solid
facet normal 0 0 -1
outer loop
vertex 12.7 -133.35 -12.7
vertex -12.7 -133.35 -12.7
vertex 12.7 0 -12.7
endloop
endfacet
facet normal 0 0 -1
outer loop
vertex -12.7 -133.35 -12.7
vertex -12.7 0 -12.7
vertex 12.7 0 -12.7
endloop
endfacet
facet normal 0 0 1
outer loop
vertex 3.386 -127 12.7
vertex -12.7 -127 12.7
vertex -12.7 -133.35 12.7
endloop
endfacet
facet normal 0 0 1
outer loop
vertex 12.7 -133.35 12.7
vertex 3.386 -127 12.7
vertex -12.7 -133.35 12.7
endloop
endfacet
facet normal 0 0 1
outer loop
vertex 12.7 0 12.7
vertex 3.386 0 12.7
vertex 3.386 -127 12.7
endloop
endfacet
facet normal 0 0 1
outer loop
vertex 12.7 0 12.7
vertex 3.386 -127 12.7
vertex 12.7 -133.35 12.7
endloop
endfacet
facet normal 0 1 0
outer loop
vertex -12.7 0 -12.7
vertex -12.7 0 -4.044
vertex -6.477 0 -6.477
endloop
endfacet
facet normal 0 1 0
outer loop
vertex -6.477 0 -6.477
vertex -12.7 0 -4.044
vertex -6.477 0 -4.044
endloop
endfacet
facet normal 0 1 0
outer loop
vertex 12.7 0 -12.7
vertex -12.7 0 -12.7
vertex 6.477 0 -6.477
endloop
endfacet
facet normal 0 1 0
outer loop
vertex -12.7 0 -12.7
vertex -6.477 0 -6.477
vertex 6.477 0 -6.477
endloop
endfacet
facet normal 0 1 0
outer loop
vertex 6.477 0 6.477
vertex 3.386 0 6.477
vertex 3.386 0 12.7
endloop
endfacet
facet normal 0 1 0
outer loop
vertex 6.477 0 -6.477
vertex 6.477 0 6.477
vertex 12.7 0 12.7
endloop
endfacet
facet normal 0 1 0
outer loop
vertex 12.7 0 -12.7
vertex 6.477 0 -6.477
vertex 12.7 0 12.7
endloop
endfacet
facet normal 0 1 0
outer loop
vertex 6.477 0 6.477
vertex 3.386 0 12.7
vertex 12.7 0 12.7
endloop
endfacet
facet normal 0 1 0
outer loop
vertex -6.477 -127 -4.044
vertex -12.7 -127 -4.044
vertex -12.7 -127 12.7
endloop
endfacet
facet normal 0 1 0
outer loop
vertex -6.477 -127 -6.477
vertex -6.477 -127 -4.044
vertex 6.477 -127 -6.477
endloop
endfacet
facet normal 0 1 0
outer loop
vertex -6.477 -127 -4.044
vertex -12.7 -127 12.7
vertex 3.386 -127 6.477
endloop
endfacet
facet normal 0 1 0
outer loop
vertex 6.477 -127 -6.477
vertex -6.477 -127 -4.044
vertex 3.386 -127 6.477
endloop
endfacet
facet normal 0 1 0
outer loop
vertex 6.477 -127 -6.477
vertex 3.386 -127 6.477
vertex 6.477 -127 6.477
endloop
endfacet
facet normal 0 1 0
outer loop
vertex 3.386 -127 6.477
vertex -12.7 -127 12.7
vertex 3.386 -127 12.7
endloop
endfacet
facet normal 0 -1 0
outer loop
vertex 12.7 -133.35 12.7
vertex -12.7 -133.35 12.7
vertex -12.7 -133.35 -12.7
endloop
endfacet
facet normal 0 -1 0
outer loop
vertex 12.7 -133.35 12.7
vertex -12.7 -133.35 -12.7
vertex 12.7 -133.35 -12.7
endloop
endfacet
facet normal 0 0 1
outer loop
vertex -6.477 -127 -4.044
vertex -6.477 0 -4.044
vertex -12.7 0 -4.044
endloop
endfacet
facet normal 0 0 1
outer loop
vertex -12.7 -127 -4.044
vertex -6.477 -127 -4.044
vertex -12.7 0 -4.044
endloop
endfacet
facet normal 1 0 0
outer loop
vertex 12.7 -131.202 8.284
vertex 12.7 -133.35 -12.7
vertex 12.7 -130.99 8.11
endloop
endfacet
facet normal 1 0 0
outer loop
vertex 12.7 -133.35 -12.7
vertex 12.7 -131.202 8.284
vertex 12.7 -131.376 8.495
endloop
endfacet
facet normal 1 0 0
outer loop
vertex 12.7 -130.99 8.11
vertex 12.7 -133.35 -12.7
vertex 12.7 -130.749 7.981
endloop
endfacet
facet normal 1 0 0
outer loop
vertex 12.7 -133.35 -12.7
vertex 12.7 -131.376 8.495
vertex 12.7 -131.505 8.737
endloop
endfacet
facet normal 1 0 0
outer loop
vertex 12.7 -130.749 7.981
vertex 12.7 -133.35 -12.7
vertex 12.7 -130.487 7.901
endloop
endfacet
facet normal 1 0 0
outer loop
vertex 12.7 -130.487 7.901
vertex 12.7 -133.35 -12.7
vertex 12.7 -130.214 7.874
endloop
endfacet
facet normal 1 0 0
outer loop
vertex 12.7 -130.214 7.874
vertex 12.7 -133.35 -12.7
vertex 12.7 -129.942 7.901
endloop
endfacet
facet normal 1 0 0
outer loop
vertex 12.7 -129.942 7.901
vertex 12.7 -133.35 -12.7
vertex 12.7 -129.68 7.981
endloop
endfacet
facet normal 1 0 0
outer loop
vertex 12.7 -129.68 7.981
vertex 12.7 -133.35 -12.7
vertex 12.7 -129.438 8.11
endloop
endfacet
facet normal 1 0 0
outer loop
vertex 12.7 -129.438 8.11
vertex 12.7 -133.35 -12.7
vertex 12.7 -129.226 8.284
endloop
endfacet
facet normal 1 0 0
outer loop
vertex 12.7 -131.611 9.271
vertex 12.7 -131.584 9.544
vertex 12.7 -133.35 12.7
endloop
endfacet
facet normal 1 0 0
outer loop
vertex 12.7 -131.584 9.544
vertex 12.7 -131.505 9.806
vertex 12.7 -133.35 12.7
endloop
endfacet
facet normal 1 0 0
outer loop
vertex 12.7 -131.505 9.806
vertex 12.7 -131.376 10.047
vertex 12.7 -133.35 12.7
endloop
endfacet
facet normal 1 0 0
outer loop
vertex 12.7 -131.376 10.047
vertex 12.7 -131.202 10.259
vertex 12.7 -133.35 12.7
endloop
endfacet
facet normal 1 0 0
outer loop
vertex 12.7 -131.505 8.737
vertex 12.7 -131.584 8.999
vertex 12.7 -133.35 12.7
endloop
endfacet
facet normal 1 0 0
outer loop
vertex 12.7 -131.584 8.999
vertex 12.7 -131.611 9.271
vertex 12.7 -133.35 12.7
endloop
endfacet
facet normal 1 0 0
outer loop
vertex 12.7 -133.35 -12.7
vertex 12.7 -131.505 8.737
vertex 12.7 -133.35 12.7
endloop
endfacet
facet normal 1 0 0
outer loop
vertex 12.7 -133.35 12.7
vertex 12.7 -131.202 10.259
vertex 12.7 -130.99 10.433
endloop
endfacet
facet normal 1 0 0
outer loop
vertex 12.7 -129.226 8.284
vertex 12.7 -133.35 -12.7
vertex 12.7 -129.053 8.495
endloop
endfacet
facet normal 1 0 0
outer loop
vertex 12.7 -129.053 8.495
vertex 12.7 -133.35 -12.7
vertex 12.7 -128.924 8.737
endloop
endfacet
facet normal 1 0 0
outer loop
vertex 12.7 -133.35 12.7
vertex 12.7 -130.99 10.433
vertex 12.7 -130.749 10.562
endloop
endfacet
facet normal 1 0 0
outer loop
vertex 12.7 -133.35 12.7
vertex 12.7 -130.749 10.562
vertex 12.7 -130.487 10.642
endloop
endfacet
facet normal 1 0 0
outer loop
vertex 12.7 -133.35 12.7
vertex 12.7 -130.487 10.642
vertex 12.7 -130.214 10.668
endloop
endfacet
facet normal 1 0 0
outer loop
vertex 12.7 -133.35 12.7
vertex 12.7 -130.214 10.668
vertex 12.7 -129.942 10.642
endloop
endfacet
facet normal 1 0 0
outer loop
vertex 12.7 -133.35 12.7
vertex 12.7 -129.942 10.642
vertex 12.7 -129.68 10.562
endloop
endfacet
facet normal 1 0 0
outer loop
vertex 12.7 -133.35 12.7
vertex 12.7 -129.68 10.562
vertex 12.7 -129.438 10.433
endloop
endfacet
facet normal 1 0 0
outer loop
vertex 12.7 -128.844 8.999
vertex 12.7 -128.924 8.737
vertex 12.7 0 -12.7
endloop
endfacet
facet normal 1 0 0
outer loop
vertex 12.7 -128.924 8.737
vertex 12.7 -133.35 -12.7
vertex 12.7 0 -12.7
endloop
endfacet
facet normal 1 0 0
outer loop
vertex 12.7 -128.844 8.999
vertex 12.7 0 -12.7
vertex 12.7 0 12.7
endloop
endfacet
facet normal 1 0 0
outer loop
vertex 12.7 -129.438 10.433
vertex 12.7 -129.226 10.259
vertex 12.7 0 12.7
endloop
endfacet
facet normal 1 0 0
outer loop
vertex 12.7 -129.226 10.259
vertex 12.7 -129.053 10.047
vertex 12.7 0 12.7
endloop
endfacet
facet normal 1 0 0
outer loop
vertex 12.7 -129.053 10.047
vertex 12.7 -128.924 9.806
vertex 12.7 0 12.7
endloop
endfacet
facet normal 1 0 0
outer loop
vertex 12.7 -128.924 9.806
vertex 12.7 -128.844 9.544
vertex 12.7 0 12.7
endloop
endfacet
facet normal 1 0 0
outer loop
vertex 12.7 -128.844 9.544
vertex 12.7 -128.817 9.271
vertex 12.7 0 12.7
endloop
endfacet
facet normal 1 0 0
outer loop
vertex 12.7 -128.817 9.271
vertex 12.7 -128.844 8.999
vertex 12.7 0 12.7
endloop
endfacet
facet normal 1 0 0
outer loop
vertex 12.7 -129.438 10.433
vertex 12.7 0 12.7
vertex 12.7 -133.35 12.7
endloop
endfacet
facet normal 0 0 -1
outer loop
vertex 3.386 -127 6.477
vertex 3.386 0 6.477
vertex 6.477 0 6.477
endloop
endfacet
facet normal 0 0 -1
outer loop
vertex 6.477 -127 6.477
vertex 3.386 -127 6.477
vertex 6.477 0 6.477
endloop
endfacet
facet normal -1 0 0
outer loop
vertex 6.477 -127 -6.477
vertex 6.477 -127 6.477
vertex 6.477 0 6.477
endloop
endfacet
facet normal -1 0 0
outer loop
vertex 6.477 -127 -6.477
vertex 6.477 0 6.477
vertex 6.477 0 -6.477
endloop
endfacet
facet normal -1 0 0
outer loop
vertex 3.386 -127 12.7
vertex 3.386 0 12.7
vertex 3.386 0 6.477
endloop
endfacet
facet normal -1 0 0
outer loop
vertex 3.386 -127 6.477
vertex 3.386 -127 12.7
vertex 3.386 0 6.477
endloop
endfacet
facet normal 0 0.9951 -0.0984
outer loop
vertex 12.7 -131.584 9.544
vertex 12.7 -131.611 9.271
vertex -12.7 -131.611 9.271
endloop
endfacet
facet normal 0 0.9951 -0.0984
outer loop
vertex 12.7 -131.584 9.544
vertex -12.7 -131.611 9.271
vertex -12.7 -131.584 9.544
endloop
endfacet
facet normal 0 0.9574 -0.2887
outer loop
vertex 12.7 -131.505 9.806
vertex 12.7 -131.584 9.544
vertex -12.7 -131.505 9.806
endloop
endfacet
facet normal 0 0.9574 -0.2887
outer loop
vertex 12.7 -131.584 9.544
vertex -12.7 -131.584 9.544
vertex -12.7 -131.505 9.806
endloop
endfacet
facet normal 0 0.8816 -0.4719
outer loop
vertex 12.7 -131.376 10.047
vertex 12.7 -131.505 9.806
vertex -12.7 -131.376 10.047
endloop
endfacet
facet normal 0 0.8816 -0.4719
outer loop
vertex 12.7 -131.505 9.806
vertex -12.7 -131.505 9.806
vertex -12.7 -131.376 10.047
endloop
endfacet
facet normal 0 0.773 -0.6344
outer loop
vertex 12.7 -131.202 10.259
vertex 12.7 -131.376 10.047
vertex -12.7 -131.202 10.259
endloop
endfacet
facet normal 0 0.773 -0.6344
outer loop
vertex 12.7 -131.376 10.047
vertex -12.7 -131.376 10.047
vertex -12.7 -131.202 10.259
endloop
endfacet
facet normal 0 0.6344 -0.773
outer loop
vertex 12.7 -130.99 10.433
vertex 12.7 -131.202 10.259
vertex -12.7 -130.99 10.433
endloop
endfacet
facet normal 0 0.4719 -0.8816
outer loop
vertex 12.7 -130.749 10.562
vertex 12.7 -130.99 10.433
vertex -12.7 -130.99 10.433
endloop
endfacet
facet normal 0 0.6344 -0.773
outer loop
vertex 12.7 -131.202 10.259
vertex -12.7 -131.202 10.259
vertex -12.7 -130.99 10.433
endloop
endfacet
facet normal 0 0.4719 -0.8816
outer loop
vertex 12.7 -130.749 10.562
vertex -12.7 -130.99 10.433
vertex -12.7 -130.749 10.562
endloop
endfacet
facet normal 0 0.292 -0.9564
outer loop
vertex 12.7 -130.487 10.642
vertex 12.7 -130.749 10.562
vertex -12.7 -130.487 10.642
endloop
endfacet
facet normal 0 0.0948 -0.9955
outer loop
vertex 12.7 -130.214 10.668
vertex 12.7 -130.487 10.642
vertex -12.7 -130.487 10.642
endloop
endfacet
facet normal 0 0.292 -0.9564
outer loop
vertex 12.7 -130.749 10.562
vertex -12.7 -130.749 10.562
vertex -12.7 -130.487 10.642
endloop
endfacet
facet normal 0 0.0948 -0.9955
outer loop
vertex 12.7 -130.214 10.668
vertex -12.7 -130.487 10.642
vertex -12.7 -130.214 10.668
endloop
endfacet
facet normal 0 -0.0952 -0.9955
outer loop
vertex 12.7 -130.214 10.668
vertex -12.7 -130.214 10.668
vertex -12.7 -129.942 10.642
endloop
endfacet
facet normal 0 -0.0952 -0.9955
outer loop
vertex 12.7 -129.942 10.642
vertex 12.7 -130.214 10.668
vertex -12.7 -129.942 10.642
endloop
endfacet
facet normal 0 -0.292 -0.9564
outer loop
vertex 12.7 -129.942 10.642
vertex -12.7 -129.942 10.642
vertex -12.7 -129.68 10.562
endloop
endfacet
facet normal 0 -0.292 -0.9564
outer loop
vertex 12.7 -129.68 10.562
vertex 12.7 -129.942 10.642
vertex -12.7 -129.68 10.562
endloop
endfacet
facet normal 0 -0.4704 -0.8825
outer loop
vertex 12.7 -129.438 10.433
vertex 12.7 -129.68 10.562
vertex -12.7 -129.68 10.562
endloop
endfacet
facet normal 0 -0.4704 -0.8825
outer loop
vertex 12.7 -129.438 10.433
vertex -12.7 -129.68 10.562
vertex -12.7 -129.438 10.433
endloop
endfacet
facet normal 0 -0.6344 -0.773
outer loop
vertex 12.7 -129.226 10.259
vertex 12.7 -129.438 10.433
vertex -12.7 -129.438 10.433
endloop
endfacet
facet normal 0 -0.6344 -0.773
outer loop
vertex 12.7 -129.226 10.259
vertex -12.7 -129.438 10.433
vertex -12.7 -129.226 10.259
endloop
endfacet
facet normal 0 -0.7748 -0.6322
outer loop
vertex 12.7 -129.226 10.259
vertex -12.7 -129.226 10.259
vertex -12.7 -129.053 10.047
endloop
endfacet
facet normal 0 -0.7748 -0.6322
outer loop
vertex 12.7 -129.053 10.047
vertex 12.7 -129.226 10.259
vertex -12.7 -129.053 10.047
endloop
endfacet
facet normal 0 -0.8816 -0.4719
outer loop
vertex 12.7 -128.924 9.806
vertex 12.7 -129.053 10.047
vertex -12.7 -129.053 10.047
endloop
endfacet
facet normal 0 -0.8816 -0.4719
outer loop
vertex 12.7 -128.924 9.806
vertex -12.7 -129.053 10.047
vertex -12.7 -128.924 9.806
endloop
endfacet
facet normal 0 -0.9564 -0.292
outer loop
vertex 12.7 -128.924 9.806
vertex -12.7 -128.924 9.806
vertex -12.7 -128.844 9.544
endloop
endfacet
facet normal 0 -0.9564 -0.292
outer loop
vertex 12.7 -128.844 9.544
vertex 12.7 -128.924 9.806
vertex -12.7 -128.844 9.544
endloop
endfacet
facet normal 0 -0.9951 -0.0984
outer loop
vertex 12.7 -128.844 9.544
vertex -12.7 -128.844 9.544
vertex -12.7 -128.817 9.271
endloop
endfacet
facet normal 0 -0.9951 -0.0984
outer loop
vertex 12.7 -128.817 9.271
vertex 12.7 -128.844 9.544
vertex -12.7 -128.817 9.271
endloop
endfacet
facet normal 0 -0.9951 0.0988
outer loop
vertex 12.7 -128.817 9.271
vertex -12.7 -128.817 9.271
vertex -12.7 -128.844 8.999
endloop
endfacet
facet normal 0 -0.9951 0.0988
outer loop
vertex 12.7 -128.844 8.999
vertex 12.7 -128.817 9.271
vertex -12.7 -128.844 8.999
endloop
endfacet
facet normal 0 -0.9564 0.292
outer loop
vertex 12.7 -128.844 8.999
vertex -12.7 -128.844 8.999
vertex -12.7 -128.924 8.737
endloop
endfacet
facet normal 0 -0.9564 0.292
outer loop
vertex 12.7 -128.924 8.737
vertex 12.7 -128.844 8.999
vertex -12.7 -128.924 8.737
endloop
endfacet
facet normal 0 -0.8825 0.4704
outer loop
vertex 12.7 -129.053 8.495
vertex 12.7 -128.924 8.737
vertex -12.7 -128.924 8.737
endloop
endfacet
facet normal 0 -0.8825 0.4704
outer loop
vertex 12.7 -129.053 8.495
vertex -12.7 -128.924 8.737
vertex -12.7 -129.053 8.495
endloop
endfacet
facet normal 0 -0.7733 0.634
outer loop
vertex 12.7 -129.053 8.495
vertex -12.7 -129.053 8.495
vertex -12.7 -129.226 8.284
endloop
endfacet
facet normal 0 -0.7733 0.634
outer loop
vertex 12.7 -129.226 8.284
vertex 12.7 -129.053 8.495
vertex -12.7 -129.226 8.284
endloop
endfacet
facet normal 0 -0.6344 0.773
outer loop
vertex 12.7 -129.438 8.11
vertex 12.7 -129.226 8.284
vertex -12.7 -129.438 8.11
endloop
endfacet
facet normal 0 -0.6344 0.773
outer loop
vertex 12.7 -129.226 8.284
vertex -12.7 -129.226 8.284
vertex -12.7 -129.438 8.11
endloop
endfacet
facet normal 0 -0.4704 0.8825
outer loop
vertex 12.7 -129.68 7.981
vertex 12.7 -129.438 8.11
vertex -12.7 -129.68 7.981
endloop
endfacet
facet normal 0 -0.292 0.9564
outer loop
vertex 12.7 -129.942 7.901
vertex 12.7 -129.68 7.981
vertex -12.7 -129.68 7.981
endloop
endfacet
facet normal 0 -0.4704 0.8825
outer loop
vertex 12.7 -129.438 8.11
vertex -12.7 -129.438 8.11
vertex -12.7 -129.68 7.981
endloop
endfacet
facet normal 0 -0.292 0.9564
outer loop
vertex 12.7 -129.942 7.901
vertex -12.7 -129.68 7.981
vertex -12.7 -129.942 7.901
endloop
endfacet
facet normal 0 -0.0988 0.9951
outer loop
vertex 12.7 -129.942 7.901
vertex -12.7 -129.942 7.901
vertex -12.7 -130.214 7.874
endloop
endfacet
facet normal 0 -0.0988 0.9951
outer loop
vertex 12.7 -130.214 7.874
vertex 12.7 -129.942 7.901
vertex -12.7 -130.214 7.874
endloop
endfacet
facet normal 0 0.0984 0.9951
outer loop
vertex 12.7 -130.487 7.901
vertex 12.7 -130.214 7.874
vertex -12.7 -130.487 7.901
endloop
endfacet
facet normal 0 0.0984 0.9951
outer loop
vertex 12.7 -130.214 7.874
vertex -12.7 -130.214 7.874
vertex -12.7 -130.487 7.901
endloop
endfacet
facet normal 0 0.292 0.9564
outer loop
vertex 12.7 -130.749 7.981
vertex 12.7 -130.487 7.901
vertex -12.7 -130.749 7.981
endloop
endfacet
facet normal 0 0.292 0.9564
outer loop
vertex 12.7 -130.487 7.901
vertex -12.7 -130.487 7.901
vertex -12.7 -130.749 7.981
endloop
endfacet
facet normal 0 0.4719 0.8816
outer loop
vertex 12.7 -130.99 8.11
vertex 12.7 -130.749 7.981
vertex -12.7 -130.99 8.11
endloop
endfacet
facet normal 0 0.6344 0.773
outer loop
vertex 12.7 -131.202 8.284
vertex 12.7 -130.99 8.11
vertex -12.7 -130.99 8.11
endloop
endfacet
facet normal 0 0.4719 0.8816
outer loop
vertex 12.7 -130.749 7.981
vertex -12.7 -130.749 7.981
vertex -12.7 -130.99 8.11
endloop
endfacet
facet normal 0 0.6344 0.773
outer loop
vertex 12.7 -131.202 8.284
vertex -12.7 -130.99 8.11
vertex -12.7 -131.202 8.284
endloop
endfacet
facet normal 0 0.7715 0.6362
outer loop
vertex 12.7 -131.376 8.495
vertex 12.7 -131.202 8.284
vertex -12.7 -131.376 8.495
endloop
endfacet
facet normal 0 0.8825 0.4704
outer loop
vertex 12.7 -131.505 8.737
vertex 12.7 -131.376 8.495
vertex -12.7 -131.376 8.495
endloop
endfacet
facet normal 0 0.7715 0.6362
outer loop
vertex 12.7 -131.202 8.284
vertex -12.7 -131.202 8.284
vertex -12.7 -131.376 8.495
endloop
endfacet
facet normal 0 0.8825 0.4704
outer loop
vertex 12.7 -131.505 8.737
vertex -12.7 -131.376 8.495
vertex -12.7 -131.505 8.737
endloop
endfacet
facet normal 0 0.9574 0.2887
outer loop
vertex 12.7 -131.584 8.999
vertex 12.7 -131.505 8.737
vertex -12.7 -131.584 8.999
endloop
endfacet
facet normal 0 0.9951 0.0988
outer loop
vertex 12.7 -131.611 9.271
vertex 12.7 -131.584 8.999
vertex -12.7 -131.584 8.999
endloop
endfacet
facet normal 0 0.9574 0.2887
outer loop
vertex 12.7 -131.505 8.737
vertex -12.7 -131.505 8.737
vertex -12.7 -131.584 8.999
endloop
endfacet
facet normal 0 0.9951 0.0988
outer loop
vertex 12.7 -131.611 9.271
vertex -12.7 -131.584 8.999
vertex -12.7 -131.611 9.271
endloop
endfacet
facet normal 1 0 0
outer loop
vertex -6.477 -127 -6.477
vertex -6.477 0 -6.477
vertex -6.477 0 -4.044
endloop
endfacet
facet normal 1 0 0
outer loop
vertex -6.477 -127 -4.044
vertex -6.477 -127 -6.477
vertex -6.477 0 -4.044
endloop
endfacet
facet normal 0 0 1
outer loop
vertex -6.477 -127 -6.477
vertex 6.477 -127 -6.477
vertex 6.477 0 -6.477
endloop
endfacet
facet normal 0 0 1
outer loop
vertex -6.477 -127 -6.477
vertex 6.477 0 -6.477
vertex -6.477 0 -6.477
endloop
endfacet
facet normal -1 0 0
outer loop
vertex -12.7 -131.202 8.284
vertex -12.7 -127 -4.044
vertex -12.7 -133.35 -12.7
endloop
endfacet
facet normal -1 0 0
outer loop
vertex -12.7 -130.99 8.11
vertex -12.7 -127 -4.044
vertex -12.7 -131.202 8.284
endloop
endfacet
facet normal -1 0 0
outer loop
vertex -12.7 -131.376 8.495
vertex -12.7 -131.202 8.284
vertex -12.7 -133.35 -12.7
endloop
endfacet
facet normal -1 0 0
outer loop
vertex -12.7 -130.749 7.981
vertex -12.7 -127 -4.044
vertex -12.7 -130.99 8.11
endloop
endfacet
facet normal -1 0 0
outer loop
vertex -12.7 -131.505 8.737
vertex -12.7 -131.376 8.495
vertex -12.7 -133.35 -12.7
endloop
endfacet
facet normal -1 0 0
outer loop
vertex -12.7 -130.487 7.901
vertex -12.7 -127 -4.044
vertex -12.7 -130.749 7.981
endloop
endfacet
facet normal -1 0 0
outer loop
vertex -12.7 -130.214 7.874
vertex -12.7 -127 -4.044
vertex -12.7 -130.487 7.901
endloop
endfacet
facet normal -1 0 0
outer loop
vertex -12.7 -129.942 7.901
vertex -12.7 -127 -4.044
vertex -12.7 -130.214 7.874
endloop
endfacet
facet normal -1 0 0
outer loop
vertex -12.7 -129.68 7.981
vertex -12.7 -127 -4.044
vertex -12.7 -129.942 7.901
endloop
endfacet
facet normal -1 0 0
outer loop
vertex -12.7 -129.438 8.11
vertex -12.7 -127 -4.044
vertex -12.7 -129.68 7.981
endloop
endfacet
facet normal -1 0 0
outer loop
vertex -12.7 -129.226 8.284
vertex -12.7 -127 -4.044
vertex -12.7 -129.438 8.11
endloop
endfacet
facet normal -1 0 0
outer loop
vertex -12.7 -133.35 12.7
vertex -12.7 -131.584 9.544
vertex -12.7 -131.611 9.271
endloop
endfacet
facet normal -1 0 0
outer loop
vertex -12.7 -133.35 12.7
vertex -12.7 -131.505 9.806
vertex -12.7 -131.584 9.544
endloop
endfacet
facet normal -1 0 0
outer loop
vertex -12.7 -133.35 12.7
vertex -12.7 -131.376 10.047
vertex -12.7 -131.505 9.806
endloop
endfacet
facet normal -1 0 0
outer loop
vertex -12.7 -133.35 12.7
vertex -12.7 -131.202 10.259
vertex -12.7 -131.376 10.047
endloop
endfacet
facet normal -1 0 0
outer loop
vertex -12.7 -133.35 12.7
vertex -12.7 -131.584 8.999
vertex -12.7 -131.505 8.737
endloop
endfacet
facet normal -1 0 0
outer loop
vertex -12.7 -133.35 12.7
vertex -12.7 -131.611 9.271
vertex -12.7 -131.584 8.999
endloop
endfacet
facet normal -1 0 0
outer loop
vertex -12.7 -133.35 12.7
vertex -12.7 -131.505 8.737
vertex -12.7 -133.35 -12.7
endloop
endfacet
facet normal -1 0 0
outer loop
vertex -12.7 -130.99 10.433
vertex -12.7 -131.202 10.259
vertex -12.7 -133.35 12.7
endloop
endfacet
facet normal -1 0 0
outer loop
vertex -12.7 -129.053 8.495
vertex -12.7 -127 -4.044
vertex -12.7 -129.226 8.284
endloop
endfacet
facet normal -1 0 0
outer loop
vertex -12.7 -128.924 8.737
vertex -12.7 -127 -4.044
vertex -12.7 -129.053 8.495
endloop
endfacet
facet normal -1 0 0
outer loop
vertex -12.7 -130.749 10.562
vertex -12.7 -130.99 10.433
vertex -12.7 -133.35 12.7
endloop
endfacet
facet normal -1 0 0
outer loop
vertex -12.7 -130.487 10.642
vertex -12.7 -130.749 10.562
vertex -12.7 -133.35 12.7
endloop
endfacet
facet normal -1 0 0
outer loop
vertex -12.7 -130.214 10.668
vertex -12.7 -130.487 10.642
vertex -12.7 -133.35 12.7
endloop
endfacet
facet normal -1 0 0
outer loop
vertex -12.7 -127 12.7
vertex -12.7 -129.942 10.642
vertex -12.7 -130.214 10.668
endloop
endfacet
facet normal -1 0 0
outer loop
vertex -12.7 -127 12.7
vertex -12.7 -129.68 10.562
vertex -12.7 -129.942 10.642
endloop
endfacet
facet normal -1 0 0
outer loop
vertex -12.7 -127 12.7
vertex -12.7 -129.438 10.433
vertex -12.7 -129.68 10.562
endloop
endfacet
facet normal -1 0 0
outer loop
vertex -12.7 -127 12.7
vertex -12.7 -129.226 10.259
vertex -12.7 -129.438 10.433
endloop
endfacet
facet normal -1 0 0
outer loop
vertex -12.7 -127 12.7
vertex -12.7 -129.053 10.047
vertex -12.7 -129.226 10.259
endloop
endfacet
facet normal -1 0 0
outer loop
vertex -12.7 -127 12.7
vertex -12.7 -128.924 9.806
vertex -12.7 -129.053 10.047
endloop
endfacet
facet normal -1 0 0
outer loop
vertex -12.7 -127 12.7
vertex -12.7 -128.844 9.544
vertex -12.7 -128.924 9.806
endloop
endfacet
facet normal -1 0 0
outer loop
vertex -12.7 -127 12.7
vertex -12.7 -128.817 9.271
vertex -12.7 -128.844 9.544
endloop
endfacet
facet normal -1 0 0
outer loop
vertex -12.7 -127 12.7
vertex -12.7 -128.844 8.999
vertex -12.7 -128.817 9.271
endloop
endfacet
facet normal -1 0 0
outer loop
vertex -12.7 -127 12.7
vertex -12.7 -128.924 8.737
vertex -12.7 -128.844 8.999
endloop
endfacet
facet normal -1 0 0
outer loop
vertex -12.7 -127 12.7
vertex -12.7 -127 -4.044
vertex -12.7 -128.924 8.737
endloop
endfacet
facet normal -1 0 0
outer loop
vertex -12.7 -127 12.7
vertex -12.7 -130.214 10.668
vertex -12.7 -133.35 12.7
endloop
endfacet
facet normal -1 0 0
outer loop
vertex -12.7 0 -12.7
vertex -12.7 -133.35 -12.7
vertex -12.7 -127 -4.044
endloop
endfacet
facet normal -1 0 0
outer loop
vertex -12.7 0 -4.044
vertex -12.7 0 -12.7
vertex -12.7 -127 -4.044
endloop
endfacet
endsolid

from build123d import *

# Parameters (mm, degrees)
F1_DEPTH = 127
F2_W     = 25.4
F2_H     = 25.4
F3_DEPTH = 6.35
F4_R     = 1.397
F5_DEPTH = 25.401


with BuildPart() as f1:
    # F0 (on Front) → F1 (new body)
    with BuildSketch(Plane.XZ):
        Polygon((12.7, 12.7), (3.386421, 12.7), (3.386421, 6.477), (6.477, 6.477), (6.477, -6.477), (-6.477, -6.477), (-6.477, -4.043587), (-12.7, -4.043587), (-12.7, -12.7), (12.7, -12.7), align=None)
    extrude(amount=F1_DEPTH)

    # F2 (on face) → F3 (join)
    with BuildSketch(Plane.XZ.offset(127)):
        Rectangle(F2_W, F2_H)
    extrude(amount=F3_DEPTH)

    # F4 (on face) → F5 (cut, through all)
    with BuildSketch(Plane(origin=(-12.7, 0, 0), x_dir=(0, -1, 0), z_dir=(-1, 0, 0))):
        with Locations((130.214259, 9.271351)):
            Circle(F4_R)
    extrude(amount=-F5_DEPTH, mode=Mode.SUBTRACT)


solid = f1.part
